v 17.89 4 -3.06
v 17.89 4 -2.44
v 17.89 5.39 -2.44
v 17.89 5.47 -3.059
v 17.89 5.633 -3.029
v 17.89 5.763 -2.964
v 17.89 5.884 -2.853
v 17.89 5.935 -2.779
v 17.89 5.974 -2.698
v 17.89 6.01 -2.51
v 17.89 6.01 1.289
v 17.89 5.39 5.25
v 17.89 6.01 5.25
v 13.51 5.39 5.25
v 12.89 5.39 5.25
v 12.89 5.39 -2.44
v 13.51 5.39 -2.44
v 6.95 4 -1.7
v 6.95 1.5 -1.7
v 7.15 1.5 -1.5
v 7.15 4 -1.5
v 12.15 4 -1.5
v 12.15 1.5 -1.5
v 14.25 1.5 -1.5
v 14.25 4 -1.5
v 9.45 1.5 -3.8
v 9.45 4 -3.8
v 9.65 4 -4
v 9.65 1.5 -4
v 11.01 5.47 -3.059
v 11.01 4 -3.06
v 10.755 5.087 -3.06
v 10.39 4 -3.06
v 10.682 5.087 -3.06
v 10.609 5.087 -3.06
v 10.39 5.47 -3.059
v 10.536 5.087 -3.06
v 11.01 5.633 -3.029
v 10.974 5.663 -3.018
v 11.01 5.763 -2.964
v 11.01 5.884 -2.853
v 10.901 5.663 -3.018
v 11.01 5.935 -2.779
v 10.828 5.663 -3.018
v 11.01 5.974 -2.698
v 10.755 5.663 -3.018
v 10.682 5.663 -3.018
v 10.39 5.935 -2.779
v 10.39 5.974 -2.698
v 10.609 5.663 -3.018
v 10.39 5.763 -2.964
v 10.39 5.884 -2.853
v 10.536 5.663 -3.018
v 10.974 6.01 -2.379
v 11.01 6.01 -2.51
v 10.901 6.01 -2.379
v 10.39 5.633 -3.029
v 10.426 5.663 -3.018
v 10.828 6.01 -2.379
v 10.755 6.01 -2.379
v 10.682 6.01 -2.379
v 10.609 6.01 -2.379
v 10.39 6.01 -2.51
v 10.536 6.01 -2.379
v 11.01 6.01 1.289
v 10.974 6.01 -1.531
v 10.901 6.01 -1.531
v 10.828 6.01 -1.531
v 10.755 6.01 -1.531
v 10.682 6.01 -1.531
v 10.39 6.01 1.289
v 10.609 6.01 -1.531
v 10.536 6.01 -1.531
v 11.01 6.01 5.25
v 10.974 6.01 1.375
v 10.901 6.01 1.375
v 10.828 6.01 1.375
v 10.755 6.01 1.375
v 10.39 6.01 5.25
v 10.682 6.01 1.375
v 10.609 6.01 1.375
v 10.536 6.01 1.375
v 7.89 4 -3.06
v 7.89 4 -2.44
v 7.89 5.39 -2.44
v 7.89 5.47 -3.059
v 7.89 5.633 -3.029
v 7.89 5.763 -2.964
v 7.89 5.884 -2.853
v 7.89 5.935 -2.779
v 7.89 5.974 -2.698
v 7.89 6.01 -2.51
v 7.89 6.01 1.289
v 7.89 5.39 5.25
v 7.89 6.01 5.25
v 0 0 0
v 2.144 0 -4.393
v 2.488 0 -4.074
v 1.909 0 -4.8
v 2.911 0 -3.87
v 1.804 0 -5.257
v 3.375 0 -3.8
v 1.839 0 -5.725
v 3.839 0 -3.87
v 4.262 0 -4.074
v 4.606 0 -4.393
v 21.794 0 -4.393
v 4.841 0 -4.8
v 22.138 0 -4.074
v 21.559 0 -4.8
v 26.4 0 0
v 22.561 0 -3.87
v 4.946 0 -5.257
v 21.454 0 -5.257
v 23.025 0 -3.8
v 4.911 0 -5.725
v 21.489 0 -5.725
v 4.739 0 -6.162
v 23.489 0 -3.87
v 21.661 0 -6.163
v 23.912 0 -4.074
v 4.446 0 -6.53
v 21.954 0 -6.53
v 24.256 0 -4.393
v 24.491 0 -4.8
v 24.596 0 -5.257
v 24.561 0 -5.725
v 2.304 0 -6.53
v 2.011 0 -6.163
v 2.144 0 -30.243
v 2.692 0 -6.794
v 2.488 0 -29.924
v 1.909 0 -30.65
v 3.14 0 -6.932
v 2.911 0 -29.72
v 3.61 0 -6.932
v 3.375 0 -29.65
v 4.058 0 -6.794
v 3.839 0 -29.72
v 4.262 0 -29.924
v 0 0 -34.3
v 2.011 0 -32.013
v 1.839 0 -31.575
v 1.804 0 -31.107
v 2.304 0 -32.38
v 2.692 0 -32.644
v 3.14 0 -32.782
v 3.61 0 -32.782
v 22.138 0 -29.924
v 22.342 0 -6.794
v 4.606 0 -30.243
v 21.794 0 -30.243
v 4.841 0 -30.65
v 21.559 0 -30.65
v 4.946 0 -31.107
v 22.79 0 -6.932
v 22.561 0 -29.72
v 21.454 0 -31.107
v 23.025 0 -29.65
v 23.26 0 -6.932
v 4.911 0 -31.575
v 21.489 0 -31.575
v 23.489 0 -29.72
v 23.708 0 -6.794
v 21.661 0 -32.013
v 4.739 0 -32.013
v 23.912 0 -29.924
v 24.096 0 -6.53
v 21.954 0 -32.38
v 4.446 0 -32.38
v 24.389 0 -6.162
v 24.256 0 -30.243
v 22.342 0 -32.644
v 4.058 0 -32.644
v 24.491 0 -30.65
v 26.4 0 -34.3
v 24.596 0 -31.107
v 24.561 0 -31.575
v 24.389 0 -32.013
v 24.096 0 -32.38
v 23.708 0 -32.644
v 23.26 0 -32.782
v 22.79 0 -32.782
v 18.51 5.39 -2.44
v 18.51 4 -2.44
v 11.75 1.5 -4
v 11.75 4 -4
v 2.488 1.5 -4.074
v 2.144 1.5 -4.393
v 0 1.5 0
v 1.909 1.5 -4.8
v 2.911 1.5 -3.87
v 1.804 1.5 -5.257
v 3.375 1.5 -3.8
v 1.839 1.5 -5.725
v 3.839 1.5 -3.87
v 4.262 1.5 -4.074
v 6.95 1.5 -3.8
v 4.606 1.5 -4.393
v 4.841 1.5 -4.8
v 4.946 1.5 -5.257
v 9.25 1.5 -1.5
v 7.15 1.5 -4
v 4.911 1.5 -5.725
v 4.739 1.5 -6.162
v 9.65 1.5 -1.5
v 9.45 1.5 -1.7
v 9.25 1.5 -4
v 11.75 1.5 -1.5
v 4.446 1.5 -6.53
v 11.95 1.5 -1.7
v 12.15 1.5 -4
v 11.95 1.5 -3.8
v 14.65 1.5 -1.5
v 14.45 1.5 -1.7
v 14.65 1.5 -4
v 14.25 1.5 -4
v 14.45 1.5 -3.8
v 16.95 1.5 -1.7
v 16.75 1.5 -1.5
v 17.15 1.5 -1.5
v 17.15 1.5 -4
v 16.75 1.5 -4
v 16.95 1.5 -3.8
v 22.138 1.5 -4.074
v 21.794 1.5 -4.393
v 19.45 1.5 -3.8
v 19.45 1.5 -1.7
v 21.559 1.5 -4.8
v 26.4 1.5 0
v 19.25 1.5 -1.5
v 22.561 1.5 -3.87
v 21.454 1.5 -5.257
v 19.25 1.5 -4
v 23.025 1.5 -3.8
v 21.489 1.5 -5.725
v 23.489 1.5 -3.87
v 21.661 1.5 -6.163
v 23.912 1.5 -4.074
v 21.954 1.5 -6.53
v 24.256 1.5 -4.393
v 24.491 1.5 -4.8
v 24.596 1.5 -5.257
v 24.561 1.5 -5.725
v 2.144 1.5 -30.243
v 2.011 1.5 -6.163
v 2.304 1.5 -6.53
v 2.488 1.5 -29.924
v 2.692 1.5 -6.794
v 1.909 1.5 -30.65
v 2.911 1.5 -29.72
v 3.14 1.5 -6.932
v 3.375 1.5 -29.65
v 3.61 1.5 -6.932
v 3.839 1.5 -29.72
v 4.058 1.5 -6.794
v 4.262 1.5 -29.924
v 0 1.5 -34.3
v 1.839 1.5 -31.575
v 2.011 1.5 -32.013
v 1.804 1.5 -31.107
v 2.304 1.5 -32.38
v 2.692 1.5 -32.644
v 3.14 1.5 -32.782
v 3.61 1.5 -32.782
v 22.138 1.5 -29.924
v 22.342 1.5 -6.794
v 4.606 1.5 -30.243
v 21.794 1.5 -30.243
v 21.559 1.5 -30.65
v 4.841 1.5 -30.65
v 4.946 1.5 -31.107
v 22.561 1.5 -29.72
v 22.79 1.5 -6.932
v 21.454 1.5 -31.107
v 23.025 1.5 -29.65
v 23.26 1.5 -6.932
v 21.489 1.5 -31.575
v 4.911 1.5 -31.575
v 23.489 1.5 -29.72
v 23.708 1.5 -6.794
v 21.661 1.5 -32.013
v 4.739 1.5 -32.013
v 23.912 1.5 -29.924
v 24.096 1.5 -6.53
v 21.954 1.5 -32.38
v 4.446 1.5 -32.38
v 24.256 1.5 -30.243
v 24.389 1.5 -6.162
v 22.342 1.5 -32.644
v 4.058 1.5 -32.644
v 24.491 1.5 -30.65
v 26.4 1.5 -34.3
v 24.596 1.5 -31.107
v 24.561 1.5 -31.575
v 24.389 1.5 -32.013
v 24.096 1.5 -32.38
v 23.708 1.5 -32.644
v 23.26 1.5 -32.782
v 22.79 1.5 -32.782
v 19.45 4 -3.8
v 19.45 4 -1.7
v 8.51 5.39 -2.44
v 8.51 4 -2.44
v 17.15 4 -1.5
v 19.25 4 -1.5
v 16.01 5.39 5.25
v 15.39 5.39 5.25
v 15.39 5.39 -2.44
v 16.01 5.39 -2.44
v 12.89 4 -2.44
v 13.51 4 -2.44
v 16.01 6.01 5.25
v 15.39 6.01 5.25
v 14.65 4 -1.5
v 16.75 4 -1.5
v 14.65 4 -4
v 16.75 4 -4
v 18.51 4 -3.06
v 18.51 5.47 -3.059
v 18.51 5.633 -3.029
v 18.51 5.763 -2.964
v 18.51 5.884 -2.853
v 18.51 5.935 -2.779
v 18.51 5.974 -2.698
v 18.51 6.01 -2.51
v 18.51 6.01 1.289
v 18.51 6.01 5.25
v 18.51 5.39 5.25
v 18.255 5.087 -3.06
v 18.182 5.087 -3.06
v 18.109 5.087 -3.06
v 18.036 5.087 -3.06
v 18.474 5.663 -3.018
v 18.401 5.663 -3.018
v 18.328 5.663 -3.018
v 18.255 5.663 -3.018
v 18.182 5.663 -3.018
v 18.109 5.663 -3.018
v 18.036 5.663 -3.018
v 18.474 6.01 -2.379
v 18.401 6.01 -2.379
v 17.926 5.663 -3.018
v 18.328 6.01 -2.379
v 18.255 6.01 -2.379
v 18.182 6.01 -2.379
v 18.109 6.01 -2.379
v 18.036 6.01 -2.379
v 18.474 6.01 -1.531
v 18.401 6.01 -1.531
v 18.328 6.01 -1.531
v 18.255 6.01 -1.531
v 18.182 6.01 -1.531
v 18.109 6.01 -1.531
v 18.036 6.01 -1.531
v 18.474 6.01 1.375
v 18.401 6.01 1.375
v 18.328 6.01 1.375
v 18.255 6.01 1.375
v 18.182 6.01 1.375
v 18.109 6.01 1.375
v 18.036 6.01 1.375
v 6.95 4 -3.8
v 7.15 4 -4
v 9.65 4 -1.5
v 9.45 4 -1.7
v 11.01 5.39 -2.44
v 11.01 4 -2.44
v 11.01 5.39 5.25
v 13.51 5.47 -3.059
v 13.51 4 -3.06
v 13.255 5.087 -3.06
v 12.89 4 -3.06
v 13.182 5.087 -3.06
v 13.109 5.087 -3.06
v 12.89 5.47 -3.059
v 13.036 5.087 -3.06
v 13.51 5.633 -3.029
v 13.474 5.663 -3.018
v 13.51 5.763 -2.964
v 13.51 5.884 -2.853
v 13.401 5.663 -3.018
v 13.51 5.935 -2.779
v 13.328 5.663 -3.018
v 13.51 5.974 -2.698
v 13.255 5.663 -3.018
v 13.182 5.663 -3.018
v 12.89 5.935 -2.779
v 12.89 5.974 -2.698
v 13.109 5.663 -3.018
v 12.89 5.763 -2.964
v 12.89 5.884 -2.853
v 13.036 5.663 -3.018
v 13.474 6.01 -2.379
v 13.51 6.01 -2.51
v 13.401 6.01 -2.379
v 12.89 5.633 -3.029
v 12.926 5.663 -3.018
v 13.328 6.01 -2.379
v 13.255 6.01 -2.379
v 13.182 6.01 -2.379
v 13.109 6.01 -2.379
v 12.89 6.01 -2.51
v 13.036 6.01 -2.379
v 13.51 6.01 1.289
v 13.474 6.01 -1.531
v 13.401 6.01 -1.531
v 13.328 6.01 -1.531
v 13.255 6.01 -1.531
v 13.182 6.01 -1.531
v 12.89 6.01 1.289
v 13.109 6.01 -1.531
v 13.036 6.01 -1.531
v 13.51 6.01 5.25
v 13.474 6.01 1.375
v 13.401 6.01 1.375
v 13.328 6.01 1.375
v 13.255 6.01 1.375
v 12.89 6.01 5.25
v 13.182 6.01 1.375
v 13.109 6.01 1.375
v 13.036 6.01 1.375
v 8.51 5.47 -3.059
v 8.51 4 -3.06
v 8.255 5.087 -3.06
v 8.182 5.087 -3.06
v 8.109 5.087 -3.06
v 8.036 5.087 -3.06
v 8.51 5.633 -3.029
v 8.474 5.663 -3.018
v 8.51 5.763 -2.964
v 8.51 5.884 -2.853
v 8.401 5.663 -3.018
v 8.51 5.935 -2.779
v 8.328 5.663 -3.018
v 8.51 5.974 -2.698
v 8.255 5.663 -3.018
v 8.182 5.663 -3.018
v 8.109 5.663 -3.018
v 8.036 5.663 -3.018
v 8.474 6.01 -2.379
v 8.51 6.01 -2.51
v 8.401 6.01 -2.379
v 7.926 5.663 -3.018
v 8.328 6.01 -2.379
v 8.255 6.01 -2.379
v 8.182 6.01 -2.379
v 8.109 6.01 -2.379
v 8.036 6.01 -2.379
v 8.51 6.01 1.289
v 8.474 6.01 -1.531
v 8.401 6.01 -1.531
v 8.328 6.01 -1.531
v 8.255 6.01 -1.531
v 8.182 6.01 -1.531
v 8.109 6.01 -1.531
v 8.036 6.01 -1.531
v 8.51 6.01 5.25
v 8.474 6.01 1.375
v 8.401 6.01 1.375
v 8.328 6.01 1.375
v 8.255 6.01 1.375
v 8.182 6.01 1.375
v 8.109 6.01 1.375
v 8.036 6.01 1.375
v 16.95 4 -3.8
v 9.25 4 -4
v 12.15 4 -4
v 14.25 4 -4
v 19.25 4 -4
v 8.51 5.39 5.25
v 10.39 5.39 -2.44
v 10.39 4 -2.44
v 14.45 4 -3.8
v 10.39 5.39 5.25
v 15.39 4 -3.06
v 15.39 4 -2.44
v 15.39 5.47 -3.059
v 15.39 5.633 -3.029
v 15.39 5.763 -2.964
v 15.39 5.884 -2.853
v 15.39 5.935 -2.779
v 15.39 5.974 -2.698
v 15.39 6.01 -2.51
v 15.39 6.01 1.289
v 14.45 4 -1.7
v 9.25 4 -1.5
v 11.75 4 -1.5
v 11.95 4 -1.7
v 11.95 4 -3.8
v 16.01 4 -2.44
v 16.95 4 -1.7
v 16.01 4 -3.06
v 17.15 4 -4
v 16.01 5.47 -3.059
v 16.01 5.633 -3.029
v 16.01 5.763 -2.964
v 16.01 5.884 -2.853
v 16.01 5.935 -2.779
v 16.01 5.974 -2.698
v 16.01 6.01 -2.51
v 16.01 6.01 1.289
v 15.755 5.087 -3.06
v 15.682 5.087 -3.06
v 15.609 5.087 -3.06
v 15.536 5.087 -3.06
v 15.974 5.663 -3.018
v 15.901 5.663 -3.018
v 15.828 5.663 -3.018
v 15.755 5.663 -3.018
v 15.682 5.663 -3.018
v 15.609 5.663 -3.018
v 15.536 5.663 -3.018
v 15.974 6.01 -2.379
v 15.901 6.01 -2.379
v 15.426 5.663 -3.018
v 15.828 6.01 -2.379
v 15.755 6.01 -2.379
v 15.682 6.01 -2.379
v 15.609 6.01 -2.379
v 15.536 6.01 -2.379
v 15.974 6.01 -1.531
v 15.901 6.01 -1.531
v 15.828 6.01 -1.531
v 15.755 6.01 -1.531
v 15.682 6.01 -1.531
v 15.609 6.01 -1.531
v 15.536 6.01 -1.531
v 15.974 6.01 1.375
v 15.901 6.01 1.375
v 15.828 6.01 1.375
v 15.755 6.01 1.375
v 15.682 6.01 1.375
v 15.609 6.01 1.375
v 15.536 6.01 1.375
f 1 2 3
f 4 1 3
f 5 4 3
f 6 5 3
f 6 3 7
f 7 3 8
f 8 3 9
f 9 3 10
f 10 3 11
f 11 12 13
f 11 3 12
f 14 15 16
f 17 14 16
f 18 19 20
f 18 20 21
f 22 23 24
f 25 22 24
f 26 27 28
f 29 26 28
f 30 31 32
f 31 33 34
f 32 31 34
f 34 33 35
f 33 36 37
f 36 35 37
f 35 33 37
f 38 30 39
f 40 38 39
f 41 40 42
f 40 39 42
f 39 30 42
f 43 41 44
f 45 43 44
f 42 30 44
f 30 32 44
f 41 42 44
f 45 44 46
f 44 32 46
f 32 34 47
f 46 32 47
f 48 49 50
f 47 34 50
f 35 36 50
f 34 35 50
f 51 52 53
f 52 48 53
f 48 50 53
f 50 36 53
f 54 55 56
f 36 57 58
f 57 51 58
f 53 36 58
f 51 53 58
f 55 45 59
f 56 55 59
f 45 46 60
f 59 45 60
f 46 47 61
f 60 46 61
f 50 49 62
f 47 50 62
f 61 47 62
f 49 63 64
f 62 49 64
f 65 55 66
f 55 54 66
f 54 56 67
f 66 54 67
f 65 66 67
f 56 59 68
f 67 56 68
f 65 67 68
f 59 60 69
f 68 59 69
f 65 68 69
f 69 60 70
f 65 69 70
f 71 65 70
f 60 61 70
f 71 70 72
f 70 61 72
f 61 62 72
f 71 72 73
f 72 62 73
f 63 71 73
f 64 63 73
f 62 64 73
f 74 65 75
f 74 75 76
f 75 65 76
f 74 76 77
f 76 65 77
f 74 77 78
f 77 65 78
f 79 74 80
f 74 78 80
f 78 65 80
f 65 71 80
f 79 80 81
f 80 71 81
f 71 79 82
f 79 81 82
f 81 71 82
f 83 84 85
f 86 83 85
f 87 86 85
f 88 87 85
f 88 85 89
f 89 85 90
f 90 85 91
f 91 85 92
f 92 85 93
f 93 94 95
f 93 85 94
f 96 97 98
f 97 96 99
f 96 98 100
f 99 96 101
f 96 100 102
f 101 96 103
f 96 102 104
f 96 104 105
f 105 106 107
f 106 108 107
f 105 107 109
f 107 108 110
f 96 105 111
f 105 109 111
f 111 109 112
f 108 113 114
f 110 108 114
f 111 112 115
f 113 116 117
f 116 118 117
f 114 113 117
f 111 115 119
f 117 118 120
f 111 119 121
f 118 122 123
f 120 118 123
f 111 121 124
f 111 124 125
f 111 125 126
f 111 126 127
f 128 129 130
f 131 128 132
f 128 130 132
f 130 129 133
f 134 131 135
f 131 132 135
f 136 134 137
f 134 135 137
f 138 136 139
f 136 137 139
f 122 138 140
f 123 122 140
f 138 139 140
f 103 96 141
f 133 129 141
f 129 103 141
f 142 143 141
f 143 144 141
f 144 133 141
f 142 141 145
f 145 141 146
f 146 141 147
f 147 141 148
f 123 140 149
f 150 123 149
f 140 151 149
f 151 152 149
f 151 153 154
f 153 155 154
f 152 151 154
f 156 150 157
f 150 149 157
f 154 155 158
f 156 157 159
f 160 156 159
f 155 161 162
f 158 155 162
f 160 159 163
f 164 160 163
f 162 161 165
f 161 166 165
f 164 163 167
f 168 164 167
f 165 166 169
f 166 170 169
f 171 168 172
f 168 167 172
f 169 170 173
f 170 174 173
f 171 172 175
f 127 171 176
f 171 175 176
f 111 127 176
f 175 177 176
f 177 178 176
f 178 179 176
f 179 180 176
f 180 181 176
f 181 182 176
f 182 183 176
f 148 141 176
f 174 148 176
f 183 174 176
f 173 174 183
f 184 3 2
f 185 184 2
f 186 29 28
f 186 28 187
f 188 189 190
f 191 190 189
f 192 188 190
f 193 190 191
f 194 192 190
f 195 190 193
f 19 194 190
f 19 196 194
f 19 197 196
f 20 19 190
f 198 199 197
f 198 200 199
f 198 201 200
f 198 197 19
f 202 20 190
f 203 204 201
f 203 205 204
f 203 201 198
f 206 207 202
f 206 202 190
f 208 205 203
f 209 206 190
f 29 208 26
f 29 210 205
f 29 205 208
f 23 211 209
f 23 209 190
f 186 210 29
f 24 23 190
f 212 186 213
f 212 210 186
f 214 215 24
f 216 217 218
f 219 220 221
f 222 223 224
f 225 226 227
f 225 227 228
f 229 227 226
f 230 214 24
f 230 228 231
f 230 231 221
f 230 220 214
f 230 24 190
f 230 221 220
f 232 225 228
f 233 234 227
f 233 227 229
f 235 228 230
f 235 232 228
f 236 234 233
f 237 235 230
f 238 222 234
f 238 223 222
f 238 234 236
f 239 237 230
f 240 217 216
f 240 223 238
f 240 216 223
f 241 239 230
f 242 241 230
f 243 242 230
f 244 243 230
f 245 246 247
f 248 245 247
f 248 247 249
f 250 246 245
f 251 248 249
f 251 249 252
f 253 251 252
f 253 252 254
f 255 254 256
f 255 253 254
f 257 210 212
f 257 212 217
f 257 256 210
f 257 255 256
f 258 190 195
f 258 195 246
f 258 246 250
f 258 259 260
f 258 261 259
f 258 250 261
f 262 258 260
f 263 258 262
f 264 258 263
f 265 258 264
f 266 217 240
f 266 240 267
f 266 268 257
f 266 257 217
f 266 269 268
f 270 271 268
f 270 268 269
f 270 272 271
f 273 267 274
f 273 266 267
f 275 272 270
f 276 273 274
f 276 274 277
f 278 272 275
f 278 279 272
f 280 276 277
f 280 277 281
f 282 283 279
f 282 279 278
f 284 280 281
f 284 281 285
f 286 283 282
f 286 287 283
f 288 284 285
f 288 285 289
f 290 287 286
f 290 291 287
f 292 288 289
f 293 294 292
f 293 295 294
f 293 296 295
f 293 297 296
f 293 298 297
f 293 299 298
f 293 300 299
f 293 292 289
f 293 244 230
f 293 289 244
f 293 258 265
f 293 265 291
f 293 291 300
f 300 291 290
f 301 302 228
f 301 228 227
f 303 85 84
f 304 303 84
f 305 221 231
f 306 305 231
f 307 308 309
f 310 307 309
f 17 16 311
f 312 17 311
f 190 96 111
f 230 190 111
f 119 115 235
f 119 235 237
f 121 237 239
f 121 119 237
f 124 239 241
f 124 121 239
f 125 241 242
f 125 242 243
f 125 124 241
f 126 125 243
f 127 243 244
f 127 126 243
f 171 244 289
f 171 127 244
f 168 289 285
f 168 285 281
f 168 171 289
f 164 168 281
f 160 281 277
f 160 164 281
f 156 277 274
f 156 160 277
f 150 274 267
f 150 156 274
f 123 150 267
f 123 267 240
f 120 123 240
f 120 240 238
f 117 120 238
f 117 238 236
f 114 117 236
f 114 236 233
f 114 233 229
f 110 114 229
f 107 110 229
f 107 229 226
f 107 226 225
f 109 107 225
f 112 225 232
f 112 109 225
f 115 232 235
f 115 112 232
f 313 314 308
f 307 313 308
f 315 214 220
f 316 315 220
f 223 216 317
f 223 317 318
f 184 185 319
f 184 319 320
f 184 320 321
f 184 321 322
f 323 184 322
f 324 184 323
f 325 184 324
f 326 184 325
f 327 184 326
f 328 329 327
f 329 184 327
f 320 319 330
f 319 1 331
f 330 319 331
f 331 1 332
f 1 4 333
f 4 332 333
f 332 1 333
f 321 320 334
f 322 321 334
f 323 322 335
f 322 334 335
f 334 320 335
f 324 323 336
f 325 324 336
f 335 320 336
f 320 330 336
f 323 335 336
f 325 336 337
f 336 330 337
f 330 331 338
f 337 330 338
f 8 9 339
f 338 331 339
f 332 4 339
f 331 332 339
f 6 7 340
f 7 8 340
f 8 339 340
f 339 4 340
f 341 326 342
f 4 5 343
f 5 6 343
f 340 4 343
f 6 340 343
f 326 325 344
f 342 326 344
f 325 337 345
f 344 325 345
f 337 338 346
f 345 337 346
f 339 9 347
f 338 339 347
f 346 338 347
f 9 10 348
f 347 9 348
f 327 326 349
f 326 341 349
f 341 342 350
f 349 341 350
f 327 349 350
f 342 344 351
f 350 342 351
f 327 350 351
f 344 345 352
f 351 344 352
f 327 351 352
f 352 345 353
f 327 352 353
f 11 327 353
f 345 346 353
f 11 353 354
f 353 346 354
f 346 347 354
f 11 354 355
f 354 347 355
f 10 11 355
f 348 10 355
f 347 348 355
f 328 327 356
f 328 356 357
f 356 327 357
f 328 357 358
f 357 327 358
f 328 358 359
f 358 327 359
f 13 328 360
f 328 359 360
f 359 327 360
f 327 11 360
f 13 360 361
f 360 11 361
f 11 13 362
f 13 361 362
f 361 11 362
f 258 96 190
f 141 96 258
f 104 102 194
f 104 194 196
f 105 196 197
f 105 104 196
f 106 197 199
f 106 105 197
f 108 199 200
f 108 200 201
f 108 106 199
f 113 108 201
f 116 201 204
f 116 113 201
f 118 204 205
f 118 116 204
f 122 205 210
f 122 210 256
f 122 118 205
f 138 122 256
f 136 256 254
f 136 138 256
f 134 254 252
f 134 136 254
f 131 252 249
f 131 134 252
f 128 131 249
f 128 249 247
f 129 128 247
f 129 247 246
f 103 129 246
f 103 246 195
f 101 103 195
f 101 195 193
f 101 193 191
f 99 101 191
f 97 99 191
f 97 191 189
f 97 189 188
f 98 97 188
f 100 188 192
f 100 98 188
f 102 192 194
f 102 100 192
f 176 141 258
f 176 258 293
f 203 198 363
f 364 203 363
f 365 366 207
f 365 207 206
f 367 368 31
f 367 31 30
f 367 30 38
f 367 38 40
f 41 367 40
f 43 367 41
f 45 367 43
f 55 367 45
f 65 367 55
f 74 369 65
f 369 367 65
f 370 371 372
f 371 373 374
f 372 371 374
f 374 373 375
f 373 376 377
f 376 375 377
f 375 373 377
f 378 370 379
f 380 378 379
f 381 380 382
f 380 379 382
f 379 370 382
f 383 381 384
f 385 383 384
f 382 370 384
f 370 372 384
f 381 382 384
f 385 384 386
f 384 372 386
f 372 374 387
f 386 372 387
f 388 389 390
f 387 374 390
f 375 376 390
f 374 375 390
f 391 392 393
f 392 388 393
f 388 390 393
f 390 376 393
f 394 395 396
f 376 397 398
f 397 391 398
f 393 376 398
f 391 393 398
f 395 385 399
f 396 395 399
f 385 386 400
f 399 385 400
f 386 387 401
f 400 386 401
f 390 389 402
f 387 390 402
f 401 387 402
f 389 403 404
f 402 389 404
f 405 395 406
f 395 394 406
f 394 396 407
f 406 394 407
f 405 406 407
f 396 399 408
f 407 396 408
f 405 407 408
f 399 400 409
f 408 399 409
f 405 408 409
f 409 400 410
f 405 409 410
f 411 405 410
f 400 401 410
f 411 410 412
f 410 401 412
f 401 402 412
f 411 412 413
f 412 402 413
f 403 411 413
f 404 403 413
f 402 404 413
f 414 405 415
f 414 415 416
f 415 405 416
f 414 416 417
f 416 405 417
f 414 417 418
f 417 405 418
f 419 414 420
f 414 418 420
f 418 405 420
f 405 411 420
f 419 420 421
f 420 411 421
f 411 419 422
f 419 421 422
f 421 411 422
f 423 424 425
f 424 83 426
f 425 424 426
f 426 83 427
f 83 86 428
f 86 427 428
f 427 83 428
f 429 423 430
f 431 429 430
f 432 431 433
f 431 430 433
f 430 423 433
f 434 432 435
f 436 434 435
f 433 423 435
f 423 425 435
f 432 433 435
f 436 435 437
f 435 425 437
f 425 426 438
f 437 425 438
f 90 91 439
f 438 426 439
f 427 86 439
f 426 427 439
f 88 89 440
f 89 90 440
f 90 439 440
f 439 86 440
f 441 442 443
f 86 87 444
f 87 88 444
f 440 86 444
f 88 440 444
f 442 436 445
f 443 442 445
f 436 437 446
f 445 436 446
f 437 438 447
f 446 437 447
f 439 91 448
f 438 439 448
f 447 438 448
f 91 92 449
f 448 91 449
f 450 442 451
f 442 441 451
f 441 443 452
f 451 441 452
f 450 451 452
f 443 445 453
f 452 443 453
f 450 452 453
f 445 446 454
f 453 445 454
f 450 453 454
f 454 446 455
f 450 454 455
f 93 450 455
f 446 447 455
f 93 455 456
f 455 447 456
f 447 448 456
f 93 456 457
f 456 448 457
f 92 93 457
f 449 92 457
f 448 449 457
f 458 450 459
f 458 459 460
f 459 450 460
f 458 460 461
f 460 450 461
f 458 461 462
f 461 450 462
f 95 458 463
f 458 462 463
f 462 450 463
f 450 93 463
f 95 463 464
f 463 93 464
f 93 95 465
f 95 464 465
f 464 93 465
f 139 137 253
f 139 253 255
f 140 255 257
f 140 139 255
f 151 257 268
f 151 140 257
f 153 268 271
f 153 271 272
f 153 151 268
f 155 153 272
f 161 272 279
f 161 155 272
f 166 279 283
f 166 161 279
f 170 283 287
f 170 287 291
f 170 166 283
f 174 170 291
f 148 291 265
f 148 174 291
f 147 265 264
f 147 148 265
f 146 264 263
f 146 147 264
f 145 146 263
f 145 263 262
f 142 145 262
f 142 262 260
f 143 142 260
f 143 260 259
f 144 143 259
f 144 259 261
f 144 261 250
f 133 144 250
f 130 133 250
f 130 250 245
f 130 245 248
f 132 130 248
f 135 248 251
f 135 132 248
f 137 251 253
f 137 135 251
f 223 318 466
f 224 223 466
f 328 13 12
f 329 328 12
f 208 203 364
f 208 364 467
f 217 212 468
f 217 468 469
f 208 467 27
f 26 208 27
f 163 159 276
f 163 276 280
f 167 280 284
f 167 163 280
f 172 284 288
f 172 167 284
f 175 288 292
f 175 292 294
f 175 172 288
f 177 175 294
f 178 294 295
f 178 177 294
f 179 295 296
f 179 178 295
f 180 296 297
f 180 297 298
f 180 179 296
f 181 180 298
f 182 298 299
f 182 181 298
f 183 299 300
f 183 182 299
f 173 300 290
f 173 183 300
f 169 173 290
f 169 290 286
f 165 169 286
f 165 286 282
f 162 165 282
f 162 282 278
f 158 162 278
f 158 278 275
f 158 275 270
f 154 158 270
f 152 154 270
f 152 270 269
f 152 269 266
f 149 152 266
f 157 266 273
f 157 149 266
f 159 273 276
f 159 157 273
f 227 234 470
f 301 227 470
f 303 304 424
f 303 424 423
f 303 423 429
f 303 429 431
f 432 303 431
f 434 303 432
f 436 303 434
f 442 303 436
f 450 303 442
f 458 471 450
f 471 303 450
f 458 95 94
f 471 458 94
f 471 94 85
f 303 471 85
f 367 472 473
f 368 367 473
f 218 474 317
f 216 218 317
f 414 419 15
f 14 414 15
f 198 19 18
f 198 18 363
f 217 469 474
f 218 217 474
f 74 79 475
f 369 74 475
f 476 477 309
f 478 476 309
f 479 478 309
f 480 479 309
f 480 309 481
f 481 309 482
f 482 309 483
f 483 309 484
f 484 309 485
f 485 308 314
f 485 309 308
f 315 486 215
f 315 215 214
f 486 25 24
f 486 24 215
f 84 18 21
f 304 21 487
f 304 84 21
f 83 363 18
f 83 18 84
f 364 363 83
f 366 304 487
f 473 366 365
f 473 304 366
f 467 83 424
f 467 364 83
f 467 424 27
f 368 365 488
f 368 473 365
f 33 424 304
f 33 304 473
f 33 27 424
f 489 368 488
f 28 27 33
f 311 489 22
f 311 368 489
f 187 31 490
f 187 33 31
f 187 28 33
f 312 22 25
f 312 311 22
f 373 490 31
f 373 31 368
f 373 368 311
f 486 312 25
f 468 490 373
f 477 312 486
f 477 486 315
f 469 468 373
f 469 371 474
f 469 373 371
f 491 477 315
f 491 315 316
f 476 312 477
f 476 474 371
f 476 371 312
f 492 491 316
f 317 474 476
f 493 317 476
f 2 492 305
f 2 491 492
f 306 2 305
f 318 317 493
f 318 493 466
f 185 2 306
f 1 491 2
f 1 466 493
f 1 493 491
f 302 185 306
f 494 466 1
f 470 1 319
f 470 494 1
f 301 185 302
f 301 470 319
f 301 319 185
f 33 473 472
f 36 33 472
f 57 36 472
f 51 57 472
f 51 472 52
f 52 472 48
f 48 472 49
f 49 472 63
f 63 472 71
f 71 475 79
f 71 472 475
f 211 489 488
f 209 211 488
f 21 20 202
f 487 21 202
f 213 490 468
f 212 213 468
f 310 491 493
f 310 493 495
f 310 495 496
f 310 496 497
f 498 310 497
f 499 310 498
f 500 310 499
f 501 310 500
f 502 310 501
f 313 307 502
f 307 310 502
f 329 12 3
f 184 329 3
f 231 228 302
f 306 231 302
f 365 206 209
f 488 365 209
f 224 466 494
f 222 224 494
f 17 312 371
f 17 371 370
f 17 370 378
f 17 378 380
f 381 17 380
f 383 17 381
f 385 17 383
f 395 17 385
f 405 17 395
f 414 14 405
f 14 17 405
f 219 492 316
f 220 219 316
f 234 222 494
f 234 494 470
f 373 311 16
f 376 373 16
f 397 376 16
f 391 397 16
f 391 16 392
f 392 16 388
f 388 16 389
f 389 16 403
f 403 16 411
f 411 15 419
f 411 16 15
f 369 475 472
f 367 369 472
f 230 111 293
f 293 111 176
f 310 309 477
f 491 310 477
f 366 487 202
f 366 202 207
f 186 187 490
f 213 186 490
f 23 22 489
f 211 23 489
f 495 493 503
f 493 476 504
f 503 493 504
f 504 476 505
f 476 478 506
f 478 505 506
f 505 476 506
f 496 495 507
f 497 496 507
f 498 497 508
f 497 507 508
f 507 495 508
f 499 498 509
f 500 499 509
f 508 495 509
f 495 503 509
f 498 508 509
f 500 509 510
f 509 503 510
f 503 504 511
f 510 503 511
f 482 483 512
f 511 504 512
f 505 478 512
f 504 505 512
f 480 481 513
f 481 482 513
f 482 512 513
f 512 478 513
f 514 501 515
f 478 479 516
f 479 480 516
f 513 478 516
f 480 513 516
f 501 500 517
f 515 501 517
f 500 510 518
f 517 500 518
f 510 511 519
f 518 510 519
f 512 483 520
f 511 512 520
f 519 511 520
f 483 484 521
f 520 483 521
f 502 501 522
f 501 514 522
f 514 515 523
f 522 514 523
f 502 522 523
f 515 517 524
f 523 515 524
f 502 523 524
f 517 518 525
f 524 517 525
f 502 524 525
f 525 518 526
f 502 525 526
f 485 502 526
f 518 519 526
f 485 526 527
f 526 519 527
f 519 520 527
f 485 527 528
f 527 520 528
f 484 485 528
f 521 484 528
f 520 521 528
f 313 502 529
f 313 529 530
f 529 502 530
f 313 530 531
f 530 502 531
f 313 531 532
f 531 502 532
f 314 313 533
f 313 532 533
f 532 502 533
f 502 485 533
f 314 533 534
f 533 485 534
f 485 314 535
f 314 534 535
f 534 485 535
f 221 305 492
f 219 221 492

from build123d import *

# Parameters (mm, degrees)
SKETCH1_W           = 26.4
SKETCH1_H           = 34.3
SKETCH1_R           = 1.575
BOSS_EXTRUDE1_DEPTH = 1.5
SKETCH3_W           = 12.5
SKETCH3_H           = 2.5
BOSS_EXTRUDE2_DEPTH = 2.5
SWEEP3_START        = 7.89
SWEEP3_DEPTH        = 0.62
LPATTERN1_COUNT     = 5
LPATTERN1_PITCH     = 2.5
CUT_EXTRUDE1_DEPTH  = 2.5
CHAMFER1_SIZE       = 0.2


# Read off the part's stored shape, not the designer's step: Sweep3
with BuildPart() as part:
    # Sketch1 → Boss-Extrude1 (new body)
    with BuildSketch(Plane(origin=(0, 0, 0), x_dir=(1, 0, 0), z_dir=(0, 1, 0))):
        with Locations((13.2, 17.15)):
            Rectangle(SKETCH1_W, SKETCH1_H)
        with Locations(Location((3.375, 31.225, 0), (0, 0, 270))):
            Circle(SKETCH1_R, mode=Mode.SUBTRACT)
        with Locations(Location((23.025, 31.225, 0), (0, 0, 270))):
            Circle(SKETCH1_R, mode=Mode.SUBTRACT)
        with Locations(Location((23.025, 5.375, 0), (0, 0, 270))):
            Circle(SKETCH1_R, mode=Mode.SUBTRACT)
        with Locations(Location((3.375, 5.375, 0), (0, 0, 270))):
            Circle(SKETCH1_R, mode=Mode.SUBTRACT)
    extrude(amount=BOSS_EXTRUDE1_DEPTH)

    # Sketch3 → Boss-Extrude2 (add)
    with BuildSketch(Plane(origin=(0, 1.5, 0), x_dir=(1, 0, 0), z_dir=(0, 1, 0))):
        with Locations((13.2, 2.75)):
            Rectangle(SKETCH3_W, SKETCH3_H)
    extrude(amount=BOSS_EXTRUDE2_DEPTH)

    # Sweep3 outline → Sweep3 (add)
    with BuildSketch(Plane.YZ.offset(SWEEP3_START)):
        with BuildLine():
            Line((4, -2.44), (4, -3.06))
            add(Edge.make_bspline(
                [(4, -3.06), (4.241666667, -3.06), (4.483333333, -3.06), (4.845833333, -3.06), (4.966666667, -3.06), (5.147916667, -3.06), (5.208333333, -3.06), (5.298958333, -3.06), (5.329166667, -3.06), (5.389583333, -3.06), (5.401070283, -3.060067636), (5.503005944, -3.05992673), (5.595306319, -3.045739717), (5.730552262, -2.99013888), (5.793507671, -2.948451924), (5.898451924, -2.843507671), (5.94013888, -2.780552262), (5.995739717, -2.645306319), (6.00992673, -2.553005944), (6.010045188, -2.467309888), (6.01, -2.459635417), (6.01, -2.419270833), (6.01, -2.399088542), (6.01, -2.338541667), (6.01, -2.298177083), (6.01, -2.177083333), (6.01, -2.096354167), (6.01, -1.854166667), (6.01, -1.692708333), (6.01, -1.208333333), (6.01, -0.885416667), (6.01, 0.083333333), (6.01, 0.729166667), (6.01, 2.666666667), (6.01, 3.958333333), (6.01, 5.25)],
                knots=[0, 0, 0, 0, 0.075578312, 0.075578312, 0.113367467, 0.113367467, 0.132262045, 0.132262045, 0.141709334, 0.141709334, 0.151156623, 0.151156623, 0.161390945, 0.161390945, 0.171625267, 0.171625267, 0.181859589, 0.181859589, 0.192093911, 0.192093911, 0.198405677, 0.198405677, 0.204717443, 0.204717443, 0.217340976, 0.217340976, 0.242588041, 0.242588041, 0.293082172, 0.293082172, 0.394070433, 0.394070433, 0.596046955, 0.596046955, 1, 1, 1, 1], degree=3))
            Line((6.01, 5.25), (5.39, 5.25))
            Line((5.39, 5.25), (5.389999999, -2.440036459))
            Line((5.389999999, -2.440036459), (4, -2.44))
        make_face()
    sweep3 = extrude(amount=SWEEP3_DEPTH)

    # LPattern1: Sweep3 ×5
    with Locations(*[(i * LPATTERN1_PITCH, 0, 0) for i in range(1, LPATTERN1_COUNT)]):
        add(sweep3)

    # Sketch13 → Cut-Extrude1 (cut)
    with BuildSketch(Plane(origin=(0, 4, 0), x_dir=(1, 0, 0), z_dir=(0, 1, 0))):
        Polygon((11.95, 1.7), (11.75, 1.5), (12.15, 1.5), align=None)
        Polygon((16.75, 4), (16.95, 3.8), (17.15, 4), align=None)
        Polygon((14.45, 3.8), (14.65, 4), (14.25, 4), align=None)
        Polygon((9.45, 3.8), (9.65, 4), (9.25, 4), align=None)
        Polygon((9.25, 1.5), (9.45, 1.7), (9.65, 1.5), align=None)
        Polygon((14.45, 1.7), (14.65, 1.5), (14.25, 1.5), align=None)
        Polygon((16.75, 1.5), (17.15, 1.5), (16.95, 1.7), align=None)
        Polygon((12.15, 4), (11.75, 4), (11.95, 3.8), align=None)
    extrude(amount=-CUT_EXTRUDE1_DEPTH, mode=Mode.SUBTRACT)

    # Chamfer1
    chamfer1_edges = [part.edges().sort_by_distance(p)[0] for p in [
        (6.95, 2.75, -4),
        (6.95, 2.75, -1.5),
        (19.45, 2.75, -1.5),
        (19.45, 2.75, -4),
    ]]
    chamfer(chamfer1_edges, length=CHAMFER1_SIZE)


solid = part.part
